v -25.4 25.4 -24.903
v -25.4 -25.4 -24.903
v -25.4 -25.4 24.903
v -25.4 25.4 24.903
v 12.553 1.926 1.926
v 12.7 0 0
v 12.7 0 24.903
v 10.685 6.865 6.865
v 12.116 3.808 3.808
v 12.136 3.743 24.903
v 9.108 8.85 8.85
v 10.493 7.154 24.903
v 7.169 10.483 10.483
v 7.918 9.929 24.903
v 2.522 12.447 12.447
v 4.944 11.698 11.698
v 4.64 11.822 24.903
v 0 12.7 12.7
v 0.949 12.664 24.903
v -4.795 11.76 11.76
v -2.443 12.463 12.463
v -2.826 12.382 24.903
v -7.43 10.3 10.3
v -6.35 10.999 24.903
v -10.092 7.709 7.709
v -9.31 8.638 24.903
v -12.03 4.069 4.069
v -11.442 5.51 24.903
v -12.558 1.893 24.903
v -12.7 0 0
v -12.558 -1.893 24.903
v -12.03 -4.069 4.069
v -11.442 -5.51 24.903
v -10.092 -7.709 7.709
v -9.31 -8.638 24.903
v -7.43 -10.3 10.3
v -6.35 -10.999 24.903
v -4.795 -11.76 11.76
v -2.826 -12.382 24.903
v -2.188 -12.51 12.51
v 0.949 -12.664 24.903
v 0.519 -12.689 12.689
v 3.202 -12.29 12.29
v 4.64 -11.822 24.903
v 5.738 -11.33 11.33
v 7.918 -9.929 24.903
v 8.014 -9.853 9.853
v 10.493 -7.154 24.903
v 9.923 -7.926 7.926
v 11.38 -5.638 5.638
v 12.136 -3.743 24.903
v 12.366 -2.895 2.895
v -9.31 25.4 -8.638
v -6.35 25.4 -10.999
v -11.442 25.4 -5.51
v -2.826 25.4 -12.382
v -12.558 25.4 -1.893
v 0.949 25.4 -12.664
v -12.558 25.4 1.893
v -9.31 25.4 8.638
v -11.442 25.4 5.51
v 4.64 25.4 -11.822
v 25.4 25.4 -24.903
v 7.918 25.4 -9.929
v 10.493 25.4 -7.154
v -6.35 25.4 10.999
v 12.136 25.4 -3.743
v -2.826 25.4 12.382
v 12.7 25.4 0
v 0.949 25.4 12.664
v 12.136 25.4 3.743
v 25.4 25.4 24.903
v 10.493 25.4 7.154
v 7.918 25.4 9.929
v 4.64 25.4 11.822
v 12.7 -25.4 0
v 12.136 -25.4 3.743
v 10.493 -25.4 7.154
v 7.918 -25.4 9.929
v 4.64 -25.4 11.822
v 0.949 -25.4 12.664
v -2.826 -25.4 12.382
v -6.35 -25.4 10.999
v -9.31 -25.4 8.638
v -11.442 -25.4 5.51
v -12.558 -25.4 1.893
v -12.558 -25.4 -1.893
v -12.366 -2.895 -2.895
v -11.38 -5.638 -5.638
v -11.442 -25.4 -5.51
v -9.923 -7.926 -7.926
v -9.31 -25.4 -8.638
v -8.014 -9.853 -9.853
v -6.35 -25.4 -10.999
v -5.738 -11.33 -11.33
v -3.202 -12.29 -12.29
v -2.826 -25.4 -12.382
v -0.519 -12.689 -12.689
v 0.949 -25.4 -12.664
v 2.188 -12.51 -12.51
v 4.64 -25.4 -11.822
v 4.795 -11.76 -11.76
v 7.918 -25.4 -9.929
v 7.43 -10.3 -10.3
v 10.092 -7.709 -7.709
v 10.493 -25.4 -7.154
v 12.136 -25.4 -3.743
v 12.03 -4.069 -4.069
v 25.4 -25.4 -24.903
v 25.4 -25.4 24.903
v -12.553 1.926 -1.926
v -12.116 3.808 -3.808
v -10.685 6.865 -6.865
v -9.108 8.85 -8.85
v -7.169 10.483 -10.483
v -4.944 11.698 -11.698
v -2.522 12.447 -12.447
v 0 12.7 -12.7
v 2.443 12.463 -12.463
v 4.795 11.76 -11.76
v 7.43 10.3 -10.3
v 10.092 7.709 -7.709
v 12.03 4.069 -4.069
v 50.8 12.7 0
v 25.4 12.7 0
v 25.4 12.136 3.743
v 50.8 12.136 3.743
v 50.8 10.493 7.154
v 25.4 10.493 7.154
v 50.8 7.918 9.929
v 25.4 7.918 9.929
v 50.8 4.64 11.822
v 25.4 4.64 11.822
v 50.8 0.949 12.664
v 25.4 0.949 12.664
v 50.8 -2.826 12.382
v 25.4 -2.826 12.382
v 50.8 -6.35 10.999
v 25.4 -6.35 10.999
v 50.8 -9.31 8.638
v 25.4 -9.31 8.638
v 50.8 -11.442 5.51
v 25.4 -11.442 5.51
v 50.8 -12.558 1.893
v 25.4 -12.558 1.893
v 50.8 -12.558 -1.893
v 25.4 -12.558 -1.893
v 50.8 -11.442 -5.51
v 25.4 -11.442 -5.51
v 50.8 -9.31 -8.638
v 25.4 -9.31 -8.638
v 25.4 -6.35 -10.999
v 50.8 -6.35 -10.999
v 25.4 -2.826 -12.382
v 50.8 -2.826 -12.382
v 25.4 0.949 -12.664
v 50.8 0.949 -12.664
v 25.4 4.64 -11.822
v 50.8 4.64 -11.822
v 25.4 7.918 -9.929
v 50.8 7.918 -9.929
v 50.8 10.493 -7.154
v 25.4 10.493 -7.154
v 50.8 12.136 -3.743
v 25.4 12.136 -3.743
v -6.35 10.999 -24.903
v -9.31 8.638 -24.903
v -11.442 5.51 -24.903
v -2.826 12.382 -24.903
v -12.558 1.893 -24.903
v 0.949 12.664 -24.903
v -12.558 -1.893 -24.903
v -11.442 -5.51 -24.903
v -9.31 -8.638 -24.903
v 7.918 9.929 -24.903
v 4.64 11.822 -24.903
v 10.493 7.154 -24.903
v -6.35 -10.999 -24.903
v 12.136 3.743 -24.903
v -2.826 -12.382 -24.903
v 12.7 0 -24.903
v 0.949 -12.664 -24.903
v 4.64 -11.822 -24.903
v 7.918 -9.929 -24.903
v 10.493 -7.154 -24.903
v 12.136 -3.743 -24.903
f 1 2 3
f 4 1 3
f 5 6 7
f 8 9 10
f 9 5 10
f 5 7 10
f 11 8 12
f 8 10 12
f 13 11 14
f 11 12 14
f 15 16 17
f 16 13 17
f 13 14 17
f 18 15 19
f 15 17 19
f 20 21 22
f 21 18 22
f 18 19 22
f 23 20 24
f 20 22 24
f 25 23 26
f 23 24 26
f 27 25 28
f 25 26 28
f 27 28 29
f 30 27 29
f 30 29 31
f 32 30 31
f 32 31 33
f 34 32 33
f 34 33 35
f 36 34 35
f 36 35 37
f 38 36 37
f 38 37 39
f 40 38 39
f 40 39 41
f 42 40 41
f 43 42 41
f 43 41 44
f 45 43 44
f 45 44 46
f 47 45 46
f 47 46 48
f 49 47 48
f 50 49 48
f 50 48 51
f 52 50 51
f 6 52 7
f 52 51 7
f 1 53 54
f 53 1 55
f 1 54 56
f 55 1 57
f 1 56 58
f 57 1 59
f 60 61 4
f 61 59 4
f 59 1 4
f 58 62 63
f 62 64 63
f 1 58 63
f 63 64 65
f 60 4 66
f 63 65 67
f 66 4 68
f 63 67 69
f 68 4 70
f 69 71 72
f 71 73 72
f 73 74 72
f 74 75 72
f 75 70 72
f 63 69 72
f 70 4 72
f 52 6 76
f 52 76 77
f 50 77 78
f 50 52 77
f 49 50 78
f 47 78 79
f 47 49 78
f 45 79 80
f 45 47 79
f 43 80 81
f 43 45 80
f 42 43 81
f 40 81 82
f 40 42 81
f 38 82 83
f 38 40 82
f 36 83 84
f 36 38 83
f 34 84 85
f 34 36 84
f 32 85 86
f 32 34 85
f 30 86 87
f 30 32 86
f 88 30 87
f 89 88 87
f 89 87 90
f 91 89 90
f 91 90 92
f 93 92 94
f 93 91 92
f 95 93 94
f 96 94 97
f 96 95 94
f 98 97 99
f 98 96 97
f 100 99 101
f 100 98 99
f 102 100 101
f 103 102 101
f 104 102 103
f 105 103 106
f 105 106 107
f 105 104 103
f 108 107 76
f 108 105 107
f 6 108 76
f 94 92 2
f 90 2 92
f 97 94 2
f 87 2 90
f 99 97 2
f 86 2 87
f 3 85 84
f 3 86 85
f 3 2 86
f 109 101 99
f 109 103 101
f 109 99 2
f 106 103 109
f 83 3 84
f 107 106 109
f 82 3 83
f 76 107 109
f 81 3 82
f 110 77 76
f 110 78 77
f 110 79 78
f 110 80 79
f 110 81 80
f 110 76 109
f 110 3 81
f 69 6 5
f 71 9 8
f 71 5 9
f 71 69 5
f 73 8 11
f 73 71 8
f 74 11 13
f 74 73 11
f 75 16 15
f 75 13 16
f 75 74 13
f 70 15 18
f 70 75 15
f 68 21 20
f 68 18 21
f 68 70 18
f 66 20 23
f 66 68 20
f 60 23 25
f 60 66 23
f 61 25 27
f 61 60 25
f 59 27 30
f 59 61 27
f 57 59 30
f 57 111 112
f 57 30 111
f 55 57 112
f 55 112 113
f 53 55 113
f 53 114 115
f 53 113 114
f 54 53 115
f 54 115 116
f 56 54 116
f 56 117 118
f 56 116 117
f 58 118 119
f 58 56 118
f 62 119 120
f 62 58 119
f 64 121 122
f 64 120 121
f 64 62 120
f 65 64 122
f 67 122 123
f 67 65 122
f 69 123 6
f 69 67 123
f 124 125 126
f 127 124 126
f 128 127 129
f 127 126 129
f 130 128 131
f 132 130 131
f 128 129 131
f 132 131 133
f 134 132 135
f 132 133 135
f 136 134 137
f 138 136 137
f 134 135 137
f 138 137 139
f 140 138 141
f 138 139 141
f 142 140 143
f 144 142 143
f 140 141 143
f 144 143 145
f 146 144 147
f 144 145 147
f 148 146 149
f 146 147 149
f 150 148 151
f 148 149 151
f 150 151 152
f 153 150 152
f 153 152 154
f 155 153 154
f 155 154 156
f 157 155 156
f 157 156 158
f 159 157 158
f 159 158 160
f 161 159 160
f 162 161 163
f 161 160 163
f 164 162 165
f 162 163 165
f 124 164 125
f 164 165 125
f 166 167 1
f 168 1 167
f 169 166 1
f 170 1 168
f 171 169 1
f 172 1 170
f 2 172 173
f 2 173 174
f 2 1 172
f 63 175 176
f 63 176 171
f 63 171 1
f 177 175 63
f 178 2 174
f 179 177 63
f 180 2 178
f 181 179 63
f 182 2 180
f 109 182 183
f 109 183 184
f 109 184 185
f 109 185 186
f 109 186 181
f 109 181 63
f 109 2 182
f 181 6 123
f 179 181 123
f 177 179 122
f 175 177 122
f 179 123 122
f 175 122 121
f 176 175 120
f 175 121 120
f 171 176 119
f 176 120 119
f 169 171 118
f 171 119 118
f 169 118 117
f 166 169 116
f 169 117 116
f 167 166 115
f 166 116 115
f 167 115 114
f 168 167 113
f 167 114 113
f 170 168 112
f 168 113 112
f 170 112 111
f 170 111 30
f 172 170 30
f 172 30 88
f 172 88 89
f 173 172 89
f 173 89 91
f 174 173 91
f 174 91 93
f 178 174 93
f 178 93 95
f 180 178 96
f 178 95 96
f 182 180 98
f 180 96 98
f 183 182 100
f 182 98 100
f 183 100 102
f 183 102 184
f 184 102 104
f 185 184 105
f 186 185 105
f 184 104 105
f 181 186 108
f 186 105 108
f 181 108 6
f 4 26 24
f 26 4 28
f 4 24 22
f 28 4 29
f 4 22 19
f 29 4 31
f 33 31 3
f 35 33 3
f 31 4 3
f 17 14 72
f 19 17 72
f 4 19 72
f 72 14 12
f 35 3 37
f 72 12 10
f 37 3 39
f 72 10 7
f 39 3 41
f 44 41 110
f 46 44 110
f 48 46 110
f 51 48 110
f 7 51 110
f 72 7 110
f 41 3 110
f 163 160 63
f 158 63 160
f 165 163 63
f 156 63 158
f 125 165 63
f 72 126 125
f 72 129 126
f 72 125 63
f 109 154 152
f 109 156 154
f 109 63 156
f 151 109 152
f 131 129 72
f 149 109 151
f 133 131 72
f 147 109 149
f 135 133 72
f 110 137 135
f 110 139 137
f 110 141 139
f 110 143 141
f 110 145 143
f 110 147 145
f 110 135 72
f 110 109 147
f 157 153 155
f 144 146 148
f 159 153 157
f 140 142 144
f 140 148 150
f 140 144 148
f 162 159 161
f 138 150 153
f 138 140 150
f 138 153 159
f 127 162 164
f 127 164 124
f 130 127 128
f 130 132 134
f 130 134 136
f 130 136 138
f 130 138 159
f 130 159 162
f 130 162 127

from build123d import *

# Parameters (mm, degrees)
F0_W     = 50.8
F0_H     = 49.806252
F0_R     = 12.7
F1_DEPTH = 25.4
F3_R     = 12.7
F4_DEPTH = 50.8
F6_R     = 12.7
F7_DEPTH = 25.4


with BuildPart() as f1:
    # F0 (on Front) → F1 (new body, symmetric)
    with BuildSketch(Plane.XZ):
        Rectangle(F0_W, F0_H)
        Circle(F0_R, mode=Mode.SUBTRACT)
    extrude(amount=F1_DEPTH, both=True)

    # F3 (on offset) → F4 (cut)
    with BuildSketch(Plane.XY.offset(25.4)):
        Circle(F3_R)
    extrude(amount=-F4_DEPTH, mode=Mode.SUBTRACT)

    # F6 (on offset) → F7 (join)
    with BuildSketch(Plane.YZ.offset(25.4)):
        Circle(F6_R)
    extrude(amount=F7_DEPTH)


solid = f1.part
